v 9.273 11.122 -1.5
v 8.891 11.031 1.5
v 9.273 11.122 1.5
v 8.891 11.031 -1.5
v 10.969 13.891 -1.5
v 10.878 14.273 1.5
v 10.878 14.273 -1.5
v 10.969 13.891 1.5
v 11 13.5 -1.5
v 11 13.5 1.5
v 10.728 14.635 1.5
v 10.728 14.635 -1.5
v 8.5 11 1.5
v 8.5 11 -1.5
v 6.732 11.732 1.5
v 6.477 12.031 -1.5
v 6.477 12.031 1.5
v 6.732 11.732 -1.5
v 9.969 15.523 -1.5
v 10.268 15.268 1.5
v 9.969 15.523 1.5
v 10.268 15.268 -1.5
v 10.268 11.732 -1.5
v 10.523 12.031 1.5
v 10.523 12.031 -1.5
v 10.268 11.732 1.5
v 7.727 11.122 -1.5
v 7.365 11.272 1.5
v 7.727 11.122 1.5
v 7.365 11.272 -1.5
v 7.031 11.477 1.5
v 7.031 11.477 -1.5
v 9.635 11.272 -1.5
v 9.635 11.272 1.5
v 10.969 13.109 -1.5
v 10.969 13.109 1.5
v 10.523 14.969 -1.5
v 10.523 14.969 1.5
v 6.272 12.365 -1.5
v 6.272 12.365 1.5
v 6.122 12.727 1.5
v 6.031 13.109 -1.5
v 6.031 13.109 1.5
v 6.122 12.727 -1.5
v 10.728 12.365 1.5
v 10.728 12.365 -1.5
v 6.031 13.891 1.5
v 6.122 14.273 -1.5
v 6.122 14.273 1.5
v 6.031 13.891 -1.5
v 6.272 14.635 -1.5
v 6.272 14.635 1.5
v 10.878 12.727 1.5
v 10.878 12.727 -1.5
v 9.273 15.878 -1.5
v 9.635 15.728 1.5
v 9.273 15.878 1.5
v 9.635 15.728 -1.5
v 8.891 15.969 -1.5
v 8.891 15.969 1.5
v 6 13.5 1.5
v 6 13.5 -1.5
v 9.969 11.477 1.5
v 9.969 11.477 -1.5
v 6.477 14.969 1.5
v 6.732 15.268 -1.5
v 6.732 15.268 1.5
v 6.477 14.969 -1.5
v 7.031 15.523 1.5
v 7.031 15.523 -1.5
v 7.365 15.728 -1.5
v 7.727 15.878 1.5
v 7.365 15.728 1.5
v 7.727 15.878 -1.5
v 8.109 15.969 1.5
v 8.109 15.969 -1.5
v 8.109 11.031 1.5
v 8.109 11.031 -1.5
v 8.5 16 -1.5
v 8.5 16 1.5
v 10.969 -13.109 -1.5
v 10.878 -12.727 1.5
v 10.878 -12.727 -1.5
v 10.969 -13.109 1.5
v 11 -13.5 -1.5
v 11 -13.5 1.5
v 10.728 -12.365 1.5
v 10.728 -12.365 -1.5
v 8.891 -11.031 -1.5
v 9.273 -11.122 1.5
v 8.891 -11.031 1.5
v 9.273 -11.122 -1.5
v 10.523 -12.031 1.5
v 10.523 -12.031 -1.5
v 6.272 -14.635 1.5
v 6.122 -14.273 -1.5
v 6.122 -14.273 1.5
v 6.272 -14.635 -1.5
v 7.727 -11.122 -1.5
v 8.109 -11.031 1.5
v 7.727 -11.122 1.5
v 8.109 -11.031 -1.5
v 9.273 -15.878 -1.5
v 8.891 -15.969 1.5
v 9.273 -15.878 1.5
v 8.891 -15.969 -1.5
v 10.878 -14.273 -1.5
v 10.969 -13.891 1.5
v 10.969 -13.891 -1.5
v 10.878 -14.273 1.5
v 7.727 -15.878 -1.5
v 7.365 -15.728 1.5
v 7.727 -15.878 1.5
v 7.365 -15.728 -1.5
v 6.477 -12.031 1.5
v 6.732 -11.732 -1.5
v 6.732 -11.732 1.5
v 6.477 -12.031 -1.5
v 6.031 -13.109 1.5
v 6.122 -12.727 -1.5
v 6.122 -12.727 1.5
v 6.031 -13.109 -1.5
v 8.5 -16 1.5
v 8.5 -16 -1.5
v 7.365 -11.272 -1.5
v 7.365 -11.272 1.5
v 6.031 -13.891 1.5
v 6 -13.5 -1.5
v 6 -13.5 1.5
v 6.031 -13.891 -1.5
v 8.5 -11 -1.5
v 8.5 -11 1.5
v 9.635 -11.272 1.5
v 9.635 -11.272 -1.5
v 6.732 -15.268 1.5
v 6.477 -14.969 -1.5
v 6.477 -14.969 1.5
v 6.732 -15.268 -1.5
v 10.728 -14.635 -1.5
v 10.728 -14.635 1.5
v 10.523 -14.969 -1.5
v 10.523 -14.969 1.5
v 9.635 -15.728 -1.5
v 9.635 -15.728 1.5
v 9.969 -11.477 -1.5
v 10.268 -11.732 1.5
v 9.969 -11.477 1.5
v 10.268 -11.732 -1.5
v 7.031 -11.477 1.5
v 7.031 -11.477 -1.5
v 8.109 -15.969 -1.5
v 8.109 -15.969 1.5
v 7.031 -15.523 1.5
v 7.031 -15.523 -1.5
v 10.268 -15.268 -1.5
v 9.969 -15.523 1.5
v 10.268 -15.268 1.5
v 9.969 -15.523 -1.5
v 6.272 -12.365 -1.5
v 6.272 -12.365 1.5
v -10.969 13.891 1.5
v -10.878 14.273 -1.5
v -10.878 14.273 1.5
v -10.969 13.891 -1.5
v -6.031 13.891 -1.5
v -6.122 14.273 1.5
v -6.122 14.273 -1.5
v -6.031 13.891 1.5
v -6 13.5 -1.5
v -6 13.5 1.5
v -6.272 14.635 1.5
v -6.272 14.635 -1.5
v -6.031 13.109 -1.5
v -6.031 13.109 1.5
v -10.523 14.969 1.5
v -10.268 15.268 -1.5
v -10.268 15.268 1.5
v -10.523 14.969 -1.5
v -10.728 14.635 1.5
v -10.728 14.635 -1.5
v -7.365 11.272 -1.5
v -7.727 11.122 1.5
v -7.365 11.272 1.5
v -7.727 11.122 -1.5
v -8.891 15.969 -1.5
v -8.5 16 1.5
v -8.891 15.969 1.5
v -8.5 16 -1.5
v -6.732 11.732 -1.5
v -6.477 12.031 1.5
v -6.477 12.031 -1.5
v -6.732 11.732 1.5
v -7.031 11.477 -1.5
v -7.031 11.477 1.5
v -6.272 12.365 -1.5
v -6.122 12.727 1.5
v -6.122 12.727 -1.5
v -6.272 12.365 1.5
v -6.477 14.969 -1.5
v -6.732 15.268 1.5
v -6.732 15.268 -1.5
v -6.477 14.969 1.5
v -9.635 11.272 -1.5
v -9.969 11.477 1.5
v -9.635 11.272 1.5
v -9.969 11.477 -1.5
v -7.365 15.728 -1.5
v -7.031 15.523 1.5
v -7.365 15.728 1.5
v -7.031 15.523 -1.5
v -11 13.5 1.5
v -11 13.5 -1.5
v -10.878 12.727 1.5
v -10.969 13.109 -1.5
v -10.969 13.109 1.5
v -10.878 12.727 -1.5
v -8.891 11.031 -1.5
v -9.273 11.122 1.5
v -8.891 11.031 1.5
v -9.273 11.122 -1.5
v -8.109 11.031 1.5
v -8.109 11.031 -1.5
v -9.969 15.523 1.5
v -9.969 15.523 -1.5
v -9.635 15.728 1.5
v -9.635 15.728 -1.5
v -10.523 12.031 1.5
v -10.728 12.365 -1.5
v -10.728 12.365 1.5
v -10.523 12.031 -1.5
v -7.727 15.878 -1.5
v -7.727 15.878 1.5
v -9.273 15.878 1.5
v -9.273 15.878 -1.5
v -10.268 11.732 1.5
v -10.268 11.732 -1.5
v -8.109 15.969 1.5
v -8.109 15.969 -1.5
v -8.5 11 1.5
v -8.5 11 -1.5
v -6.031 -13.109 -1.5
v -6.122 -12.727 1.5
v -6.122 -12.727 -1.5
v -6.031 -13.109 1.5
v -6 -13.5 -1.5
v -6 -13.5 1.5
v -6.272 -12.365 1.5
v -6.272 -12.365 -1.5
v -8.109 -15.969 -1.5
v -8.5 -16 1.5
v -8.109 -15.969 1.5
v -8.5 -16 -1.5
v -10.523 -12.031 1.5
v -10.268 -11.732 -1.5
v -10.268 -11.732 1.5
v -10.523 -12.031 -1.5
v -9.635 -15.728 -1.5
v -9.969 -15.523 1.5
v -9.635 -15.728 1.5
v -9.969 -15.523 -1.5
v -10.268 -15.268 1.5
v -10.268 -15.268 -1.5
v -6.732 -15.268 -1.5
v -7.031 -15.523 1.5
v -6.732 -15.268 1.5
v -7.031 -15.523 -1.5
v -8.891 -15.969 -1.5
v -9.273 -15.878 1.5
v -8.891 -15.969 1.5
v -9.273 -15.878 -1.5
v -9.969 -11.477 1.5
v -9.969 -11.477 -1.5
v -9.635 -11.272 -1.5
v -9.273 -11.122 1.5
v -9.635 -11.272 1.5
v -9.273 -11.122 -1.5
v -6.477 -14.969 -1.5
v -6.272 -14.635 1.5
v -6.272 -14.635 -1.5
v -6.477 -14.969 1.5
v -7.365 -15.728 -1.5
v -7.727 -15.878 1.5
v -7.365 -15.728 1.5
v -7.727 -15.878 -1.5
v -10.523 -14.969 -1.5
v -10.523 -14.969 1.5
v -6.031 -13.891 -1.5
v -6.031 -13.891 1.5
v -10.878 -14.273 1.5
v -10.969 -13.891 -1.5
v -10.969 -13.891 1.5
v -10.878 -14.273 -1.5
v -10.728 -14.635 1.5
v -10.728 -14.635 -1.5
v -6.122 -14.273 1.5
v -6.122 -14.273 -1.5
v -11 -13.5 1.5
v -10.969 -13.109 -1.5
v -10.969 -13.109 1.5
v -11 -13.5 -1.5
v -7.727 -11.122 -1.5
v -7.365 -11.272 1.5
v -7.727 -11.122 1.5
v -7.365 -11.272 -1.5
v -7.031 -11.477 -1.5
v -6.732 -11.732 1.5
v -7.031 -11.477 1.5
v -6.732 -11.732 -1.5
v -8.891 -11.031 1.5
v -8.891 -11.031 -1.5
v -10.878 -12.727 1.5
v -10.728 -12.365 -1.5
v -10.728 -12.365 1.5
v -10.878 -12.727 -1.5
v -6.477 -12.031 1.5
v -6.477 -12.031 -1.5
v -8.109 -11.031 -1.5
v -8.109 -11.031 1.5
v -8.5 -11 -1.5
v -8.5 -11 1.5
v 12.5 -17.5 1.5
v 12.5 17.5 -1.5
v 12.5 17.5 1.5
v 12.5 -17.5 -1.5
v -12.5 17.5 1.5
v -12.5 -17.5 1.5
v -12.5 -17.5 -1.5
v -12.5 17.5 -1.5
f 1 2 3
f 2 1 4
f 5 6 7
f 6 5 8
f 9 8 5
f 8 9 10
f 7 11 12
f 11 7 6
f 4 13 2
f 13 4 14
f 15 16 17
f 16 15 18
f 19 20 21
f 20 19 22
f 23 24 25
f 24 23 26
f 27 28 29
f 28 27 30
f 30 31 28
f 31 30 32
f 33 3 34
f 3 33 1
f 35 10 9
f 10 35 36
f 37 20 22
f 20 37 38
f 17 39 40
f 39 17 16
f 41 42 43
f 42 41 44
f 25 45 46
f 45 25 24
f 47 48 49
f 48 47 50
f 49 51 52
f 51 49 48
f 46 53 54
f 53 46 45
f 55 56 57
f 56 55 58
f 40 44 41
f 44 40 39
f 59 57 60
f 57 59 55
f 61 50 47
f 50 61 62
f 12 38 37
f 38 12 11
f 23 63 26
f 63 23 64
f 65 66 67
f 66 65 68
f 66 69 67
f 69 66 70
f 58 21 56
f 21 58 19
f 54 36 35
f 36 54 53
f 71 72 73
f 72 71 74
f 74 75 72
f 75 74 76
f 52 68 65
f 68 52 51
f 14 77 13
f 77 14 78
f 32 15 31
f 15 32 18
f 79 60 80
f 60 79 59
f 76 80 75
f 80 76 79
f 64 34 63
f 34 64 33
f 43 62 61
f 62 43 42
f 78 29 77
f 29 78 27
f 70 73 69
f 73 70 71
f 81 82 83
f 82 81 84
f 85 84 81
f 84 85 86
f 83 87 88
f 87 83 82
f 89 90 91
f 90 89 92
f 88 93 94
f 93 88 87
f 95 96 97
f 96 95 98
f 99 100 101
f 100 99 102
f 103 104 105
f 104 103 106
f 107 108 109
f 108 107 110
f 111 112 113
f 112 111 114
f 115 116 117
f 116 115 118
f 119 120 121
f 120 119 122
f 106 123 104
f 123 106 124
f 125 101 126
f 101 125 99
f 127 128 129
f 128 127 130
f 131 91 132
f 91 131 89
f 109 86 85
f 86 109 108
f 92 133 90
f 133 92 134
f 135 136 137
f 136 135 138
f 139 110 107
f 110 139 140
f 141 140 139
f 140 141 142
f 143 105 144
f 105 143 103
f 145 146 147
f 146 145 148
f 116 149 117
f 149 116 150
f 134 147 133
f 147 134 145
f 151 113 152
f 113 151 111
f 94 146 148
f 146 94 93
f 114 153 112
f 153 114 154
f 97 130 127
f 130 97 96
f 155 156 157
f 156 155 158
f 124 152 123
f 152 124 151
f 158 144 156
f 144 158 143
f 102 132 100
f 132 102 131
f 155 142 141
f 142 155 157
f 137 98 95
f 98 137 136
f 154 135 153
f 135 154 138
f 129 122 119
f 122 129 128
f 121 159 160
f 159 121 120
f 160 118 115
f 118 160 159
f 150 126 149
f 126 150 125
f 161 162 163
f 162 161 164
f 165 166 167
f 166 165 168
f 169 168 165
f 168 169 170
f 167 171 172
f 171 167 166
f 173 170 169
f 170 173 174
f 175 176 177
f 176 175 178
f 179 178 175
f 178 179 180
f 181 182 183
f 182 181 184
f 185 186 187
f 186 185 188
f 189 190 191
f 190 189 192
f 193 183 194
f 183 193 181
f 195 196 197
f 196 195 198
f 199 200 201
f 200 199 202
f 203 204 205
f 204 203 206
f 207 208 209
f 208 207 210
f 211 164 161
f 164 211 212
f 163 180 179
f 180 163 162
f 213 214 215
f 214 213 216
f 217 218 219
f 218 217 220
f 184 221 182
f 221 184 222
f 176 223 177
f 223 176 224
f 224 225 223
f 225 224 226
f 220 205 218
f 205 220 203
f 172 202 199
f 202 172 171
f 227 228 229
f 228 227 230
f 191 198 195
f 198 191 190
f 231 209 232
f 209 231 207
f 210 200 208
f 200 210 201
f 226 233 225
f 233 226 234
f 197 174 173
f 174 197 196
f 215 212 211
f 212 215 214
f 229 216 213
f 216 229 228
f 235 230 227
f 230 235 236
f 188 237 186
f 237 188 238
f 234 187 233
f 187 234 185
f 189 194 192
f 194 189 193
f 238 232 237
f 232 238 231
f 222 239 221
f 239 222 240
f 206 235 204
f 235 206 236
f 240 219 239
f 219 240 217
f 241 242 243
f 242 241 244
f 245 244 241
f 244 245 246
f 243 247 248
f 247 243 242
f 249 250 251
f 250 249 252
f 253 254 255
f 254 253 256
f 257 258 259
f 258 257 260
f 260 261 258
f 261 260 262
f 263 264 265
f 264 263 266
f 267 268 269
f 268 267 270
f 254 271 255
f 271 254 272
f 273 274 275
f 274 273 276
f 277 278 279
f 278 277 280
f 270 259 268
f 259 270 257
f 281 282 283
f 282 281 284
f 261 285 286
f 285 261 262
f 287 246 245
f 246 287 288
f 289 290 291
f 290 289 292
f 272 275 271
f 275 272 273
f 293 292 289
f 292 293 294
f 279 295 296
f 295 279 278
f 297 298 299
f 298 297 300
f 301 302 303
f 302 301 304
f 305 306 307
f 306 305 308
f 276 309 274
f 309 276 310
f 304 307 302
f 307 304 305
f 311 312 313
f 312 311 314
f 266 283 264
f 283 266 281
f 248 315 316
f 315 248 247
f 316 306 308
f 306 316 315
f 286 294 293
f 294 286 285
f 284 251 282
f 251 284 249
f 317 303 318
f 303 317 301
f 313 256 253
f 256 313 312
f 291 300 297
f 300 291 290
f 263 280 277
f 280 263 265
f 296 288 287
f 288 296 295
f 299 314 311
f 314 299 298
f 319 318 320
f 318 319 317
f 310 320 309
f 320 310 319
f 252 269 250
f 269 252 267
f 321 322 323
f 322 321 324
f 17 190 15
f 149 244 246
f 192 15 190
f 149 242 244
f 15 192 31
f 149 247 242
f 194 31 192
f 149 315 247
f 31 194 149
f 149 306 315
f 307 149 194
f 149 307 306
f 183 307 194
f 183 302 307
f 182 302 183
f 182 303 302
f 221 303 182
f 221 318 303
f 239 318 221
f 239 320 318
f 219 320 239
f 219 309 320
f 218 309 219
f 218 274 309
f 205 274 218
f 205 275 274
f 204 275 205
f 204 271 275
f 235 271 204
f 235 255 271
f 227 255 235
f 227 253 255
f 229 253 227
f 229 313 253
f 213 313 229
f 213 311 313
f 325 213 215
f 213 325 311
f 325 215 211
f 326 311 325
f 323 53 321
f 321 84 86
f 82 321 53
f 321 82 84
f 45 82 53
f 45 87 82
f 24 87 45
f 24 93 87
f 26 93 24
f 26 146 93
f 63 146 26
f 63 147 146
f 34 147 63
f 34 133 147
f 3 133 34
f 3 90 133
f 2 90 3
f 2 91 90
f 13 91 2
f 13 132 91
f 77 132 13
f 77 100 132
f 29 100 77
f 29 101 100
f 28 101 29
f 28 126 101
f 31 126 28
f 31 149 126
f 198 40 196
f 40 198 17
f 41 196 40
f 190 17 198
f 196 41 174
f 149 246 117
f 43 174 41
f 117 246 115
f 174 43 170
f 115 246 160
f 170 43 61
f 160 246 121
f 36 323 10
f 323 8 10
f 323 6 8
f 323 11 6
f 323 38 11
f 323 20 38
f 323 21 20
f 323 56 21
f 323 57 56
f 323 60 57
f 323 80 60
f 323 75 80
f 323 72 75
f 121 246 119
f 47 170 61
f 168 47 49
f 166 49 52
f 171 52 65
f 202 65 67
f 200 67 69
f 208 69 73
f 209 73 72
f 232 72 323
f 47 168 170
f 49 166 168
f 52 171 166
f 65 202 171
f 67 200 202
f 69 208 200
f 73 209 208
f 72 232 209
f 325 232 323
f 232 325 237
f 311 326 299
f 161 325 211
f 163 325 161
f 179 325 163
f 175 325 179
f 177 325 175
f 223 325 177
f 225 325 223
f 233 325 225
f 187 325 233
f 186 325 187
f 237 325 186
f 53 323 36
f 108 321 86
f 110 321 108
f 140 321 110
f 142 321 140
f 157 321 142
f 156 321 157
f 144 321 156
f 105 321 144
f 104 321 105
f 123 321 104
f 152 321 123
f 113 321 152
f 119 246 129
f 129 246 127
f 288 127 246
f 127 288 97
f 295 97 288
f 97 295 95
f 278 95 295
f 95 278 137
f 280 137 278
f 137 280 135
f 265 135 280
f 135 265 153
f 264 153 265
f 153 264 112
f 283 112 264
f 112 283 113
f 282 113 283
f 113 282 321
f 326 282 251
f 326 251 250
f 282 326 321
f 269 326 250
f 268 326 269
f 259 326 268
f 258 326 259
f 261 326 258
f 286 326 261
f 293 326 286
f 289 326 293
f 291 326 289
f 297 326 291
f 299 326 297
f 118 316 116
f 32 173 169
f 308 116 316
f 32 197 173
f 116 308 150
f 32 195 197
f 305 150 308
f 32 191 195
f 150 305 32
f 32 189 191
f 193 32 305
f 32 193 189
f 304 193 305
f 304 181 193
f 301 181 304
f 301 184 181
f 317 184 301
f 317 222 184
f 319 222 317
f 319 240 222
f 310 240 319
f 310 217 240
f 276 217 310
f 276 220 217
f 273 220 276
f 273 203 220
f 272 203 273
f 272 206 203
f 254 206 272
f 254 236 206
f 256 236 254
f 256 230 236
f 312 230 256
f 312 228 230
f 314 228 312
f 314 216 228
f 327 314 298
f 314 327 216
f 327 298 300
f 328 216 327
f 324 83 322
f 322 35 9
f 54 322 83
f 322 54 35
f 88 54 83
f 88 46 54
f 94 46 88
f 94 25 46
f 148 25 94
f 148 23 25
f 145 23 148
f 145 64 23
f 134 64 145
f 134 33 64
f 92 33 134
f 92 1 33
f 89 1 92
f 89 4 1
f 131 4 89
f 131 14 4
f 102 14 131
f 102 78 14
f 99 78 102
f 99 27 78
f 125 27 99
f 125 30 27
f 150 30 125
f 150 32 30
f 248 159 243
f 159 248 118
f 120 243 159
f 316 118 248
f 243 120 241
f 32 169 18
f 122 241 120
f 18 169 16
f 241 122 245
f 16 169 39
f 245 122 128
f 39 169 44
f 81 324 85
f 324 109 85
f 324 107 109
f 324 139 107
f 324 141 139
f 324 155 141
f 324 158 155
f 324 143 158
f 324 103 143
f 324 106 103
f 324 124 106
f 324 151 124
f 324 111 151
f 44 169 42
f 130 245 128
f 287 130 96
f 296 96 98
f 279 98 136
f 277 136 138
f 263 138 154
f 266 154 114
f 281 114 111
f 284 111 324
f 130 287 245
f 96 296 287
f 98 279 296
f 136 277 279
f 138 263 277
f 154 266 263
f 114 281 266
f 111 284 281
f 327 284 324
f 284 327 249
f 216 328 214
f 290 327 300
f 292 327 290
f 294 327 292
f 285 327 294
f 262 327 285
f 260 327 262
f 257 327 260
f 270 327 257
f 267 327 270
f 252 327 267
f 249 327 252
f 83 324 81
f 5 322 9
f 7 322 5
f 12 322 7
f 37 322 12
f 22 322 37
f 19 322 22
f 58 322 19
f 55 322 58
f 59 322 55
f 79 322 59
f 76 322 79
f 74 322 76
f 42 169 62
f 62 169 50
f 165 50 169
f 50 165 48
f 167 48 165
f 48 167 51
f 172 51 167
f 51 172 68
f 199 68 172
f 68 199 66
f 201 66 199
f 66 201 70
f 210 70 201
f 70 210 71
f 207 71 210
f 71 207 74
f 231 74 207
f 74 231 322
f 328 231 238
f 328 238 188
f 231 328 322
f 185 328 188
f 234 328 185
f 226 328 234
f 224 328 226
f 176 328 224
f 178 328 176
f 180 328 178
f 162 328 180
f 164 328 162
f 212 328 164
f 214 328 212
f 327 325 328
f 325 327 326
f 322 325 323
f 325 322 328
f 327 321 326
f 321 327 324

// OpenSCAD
//===============================
//
//  No-tools micro motor mounts
//
//  Designed by Andrew Moore, May 2016
//      http://www.thingiverse.com/TacPar
//
//      For questions, suggestions, or whatever, 
//      please PM me through thingiverse.
//
//      This work is licensed under a Creative Commons 
//      Attribution-ShareAlike 4.0 International License.
//      http://creativecommons.org/licenses/by-sa/4.0/
//
//  This can be used with a variety of 12mm micro gear motors
//  Length dimensions may need to change to accomodate 
//  different gear ratios (particularly the Pololu 
//  1000:1 motors)
//
//  This design allows for a little slop in motor 
//  position.  You can always tighten that up with 
//  some shim stock after you insert the motor.
//
//  The mounting holes are arbitrarily set based on the plate dimensions
//  This could be improved.
//
//  If you use an encoder, you may have to solder it to the back of the 
//  motor after inserting the motor into the holder.
//===============================



//this is motor length without the gearbox
motor_length = 15;
//dimension for rounded sides on micro motor
motor_width = 12; 	
//flat sides on micro motor
motor_height = 10;
//length of the gear box not including the output shaft
gearbox_length = 10;

//wall thickness for the motor holder before tolerance losses
housing_thickness = 3;

//this defines how oversized the hole is for the motor
//this will reduce the effective housing thickness above
tolerance = 0.25;

plate_thickness = 3;
plate_width = 35;
plate_length = motor_length+gearbox_length;
tab_height = plate_thickness+2;
tab_width = 5;
tab_thickness = 1.5;


module MicroGearMotorMount()
{
	//backplate()
	difference()
	{
		positives();
		negatives();
	}
	//add ons in areas that were erased...
	
	//back plate
	translate([plate_length/2-motor_length/2,0,-(motor_height/2+plate_thickness/2)]) BackPlate();

	module positives()
	{
		//motor holding ring
		rotate([0,90,0]) 
            translate([0,0,0]) 
            cylinder(r=motor_width/2+housing_thickness, h=motor_length, center=true, $fn=40);

		translate([0,0,-motor_height/2+plate_thickness]) 
            cube([motor_length,motor_width+2*housing_thickness,motor_height-plate_thickness], center=true);

	}

	module negatives()
	{
		//cut off cylinder below the mounting plate
		translate([0,0,-(motor_height/2+plate_thickness-0.01)]) 
            cube([100,100,2*plate_thickness], center=true);

		//keyed shaft
		rotate([0,90,0]) 
        translate([0,0,-motor_length/2-0.1]) keyshaft(); 
        //translate([0,0,-motor_height/4]) cube([motor_length+.1,motor_width+1,motor_height/2], center=true);
		
	}
    module keyshaft()
    {
        difference()
		{
			positives();
            negatives();
            
			
		}
        module positives()
        {
            cylinder(r=motor_width/2+tolerance, h=motor_length+1, $fn=50);
        }
        
        module negatives()
        {
            translate([-motor_height-tolerance,0,motor_length/2+tolerance]) cube([motor_height,motor_width,motor_length+2],center=true);
            translate([motor_height+tolerance,0,motor_length/2+tolerance]) cube([motor_height,motor_width,motor_length+2],center=true);
        }
    }
  }
    module BackPlate(tab=true,screw_radius=1.75)
	{
      difference()
      {
        positives();
        negatives();
      }
        
      module positives()
      {
          cube([plate_length,plate_width,plate_thickness],center=true);
      }
      module negatives()
      {
          mount_holes();
        if (tab) {tab_slots();}
      }
        
      module mount_holes()
      {
        rotate([0,0,0]) 
                  translate([plate_length/2-4,plate_width/2-4,0]) 
                  cylinder(r=screw_radius, h=plate_thickness+1, $fn=40, center=true);
        rotate([0,0,0])
                  translate([plate_length/2-4,-(plate_width/2-4),0]) 
                  cylinder(r=screw_radius, h=plate_thickness+1, $fn=40, center=true);
        rotate([0,0,0])
                  translate([-(plate_length/2-4),plate_width/2-4,0]) 
                  cylinder(r=screw_radius, h=plate_thickness+1, $fn=40, center=true);
        rotate([0,0,0])
                  translate([-(plate_length/2-4),-(plate_width/2-4),0]) 
                  cylinder(r=screw_radius, h=plate_thickness+1, $fn=40, center=true);
        
      }
      
      module tab_slots()
      {
        translate([0.4*plate_length,tab_width/2, 0]) cube([plate_length,1,plate_thickness+1], center=true);
        translate([0.4*plate_length,-tab_width/2, 0]) cube([plate_length,1,plate_thickness+1], center=true);
        
        // If the tongue needs to be thinner
        //translate([0.4*plate_length,0, -plate_thickness/2]) cube([plate_length,tab_width,2], center=true);
      }
	

	   //gearbox tab ... stops motor from sliding forward
      if (tab)
      {
        translate([plate_length/2+tab_thickness/2,0,(tab_height-plate_thickness)/2]) cube([tab_thickness,tab_width,tab_height], center=true);
      }
}


BackPlate(tab=false, screw_radius=2.5);
//MicroGearMotorMount();
